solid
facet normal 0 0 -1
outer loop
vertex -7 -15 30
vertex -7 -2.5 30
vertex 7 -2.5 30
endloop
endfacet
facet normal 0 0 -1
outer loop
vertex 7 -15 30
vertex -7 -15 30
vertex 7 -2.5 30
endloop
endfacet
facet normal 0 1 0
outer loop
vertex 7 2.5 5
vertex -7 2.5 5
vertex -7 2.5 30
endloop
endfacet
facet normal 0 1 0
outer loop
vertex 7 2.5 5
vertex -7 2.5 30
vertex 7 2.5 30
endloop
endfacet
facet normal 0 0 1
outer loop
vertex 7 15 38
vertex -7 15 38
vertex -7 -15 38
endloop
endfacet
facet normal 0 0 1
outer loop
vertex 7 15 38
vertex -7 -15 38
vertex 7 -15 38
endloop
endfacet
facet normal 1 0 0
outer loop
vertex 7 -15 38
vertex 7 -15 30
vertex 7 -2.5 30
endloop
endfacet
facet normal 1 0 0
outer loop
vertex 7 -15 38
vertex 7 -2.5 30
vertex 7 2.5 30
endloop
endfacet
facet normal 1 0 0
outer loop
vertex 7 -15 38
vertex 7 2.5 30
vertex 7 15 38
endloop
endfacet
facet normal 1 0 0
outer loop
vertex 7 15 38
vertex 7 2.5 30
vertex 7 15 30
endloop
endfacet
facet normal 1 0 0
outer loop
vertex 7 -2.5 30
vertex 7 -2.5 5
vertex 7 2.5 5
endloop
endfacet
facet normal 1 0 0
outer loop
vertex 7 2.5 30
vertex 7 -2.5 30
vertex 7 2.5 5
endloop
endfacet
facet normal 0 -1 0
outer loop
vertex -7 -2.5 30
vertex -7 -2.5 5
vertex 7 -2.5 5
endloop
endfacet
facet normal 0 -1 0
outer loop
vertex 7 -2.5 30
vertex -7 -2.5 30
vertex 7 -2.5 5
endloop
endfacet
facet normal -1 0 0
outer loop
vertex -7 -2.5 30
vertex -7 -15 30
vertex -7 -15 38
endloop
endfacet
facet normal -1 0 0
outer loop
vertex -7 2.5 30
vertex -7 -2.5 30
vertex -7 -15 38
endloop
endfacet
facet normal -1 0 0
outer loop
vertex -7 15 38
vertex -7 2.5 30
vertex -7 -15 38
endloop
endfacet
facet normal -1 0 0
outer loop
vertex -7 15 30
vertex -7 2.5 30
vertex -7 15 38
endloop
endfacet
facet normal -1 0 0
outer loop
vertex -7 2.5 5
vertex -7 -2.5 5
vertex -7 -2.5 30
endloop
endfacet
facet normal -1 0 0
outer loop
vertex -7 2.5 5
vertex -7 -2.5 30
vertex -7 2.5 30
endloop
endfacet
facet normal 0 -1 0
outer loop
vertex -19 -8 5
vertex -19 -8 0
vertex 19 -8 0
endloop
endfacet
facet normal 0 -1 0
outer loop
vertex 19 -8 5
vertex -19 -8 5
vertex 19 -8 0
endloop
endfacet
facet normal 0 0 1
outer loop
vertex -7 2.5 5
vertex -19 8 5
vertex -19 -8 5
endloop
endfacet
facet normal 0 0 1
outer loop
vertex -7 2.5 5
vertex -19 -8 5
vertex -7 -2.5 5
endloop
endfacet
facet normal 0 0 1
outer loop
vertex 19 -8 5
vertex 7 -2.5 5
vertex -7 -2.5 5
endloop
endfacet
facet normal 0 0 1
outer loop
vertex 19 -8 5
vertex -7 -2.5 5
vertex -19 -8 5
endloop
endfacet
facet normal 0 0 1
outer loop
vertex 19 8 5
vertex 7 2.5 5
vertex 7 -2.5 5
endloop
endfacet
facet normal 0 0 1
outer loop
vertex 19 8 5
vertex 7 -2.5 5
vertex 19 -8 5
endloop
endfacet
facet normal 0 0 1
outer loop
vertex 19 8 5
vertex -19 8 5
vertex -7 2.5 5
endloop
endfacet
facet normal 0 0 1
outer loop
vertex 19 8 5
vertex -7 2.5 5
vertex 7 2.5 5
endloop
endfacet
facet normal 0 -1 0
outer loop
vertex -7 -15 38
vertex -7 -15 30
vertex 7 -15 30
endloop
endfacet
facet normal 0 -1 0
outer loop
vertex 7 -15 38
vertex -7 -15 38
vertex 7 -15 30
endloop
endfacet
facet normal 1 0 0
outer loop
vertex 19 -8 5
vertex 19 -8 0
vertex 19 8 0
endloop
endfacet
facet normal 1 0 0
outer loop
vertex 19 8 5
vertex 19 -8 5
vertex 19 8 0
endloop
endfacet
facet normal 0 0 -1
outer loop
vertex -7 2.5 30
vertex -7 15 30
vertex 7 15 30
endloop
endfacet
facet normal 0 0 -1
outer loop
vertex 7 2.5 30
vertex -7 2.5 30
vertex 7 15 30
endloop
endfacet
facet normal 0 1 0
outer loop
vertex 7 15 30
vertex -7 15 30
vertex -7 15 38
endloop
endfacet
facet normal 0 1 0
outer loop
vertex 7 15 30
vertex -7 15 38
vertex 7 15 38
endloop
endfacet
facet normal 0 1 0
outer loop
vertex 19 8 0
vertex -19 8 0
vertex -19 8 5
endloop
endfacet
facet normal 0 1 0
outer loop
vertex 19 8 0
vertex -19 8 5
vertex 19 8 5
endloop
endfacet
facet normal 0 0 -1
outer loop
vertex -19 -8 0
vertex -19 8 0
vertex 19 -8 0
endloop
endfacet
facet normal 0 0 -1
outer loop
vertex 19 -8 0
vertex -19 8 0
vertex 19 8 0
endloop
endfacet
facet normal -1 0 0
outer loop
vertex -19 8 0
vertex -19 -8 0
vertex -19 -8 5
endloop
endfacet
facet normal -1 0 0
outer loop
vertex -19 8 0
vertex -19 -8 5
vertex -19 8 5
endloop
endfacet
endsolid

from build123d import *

# Parameters (mm, degrees)
SKETCH_1_W      = 38
SKETCH_1_H      = 16
EXTRUDE_1_DEPTH = 5
SKETCH_2_W      = 14
SKETCH_2_H      = 5
EXTRUDE_2_DEPTH = 25
SKETCH_3_W      = 14
SKETCH_3_H      = 30
EXTRUDE_3_DEPTH = 8


with BuildPart() as part:
    # 草图1 → 凸台-拉伸1 (new body)
    with BuildSketch(Plane.XY):
        Rectangle(SKETCH_1_W, SKETCH_1_H)
    extrude(amount=EXTRUDE_1_DEPTH)

    # 草图2 → 凸台-拉伸2 (add)
    with BuildSketch(Plane.XY.offset(5)):
        Rectangle(SKETCH_2_W, SKETCH_2_H)
    extrude(amount=EXTRUDE_2_DEPTH)

    # 草图3 → 凸台-拉伸3 (add)
    with BuildSketch(Plane.XY.offset(30)):
        Rectangle(SKETCH_3_W, SKETCH_3_H)
    extrude(amount=EXTRUDE_3_DEPTH)


solid = part.part
